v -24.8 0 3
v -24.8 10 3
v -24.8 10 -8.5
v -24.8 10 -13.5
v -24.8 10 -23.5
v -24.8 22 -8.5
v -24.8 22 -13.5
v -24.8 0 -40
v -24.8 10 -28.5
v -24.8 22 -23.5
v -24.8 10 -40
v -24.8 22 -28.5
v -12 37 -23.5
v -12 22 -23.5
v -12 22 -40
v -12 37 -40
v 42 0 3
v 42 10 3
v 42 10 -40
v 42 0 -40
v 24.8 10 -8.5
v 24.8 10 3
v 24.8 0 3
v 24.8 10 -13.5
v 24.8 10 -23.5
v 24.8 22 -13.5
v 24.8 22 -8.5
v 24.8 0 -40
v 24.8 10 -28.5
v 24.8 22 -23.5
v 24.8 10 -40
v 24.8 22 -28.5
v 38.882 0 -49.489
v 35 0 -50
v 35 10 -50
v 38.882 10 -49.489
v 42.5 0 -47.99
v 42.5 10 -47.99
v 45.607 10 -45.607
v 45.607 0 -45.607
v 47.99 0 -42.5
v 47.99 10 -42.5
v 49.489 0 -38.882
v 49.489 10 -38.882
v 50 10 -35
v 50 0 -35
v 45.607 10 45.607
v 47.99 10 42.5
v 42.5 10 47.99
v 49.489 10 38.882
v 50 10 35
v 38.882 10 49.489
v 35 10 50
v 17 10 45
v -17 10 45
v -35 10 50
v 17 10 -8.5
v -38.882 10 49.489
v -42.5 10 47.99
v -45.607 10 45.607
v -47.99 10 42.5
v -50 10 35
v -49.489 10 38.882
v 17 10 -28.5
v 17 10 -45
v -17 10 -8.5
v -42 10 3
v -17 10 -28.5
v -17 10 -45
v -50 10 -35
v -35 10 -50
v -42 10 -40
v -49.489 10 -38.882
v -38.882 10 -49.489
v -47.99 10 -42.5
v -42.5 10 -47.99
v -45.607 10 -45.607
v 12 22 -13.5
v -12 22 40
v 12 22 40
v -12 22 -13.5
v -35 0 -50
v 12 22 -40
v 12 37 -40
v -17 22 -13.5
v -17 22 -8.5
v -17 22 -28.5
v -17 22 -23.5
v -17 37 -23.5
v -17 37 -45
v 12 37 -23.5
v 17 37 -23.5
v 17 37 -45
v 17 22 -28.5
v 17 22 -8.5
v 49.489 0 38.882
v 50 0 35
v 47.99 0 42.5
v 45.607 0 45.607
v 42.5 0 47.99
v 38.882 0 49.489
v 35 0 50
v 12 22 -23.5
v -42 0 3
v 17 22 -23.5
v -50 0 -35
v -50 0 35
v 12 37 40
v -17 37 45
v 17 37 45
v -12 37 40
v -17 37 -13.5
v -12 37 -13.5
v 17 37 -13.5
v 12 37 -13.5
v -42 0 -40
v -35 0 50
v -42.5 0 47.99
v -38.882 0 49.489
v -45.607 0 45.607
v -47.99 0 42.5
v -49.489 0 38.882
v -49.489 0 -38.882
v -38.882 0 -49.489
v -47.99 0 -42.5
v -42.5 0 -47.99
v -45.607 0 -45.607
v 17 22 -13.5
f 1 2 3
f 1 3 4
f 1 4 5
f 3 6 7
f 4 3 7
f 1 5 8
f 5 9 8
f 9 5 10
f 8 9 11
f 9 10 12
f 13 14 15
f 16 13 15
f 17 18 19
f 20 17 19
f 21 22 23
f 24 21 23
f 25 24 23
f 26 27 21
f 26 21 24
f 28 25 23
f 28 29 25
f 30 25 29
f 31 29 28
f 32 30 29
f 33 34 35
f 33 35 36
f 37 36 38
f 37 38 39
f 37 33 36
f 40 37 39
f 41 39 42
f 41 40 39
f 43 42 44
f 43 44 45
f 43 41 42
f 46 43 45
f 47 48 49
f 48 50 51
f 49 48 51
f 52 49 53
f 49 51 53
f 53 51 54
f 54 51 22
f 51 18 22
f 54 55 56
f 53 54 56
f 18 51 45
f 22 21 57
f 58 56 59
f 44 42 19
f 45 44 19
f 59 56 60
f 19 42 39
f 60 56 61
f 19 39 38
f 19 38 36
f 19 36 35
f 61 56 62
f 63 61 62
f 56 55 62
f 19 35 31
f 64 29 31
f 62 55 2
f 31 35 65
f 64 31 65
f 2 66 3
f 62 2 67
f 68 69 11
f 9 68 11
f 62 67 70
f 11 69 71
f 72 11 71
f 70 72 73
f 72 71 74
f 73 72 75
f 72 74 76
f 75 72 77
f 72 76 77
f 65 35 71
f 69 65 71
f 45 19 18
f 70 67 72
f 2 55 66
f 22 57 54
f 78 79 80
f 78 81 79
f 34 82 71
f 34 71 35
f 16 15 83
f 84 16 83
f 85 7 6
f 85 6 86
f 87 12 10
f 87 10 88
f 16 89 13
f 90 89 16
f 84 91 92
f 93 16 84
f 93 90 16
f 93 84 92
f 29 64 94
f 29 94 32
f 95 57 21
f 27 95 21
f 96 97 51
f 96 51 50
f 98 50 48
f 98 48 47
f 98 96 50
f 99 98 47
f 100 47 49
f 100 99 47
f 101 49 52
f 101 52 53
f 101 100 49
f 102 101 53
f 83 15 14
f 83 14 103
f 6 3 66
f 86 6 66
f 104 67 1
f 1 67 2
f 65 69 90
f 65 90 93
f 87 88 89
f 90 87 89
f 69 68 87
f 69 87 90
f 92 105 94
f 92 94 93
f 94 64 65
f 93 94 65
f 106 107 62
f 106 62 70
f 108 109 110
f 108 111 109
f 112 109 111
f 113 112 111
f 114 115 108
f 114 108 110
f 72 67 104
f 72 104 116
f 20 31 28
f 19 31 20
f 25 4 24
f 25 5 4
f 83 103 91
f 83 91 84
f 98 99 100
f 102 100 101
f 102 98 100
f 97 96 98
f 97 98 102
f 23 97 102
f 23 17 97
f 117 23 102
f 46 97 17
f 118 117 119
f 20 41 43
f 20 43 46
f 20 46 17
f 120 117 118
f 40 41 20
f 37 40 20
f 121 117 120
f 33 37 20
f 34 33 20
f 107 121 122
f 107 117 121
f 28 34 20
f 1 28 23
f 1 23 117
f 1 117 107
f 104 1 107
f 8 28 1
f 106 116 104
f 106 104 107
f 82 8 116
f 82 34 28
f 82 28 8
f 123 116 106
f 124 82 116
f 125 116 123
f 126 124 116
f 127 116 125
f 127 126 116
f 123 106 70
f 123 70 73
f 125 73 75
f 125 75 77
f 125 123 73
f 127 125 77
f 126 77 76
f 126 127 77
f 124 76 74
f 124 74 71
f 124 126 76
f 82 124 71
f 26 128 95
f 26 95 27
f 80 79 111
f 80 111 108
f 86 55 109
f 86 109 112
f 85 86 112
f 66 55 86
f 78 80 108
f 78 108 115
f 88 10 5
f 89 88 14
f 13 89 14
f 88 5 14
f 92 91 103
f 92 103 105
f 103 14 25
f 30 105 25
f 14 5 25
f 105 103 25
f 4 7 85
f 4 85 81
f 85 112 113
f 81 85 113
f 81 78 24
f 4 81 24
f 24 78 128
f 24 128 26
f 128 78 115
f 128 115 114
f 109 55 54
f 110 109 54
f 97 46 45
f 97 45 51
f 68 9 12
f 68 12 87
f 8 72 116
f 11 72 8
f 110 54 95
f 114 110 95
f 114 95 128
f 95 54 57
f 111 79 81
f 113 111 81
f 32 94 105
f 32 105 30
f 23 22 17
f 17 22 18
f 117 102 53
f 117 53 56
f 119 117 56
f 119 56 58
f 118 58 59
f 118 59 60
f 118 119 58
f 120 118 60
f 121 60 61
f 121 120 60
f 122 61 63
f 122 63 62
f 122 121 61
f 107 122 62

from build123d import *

# Parameters (mm, degrees)
BOSS_EXTRUDE1_DEPTH = 10
SKETCH3_W           = 17.2
SKETCH3_H           = 43
CUT_EXTRUDE1_DEPTH  = 72.414284285
SKETCH5_W           = 49.6
SKETCH5_H           = 5
BOSS_EXTRUDE3_DEPTH = 12
BOSS_EXTRUDE2_START = -12
SKETCH2_W           = 34
SKETCH2_H           = 90
SKETCH2_W_2         = 24
SKETCH2_H_2         = 80
BOSS_EXTRUDE2_DEPTH = 27
SKETCH6_W           = 5
SKETCH6_H           = 10
CUT_EXTRUDE2_DEPTH  = 27
SKETCH8_W           = 24
SKETCH8_H           = 48.5
SKETCH8_H_2         = 11.5
BOSS_EXTRUDE4_DEPTH = 12


with BuildPart() as part:
    # Sketch1 → Boss-Extrude1 (new body)
    with BuildSketch(Plane(origin=(0, 0, 0), x_dir=(1, 0, 0), z_dir=(0, 1, 0))):
        with BuildLine():
            Line((-35, 50), (35, 50))
            ThreePointArc((35, 50), (45.606601718, 45.606601718), (50, 35))
            Line((50, 35), (50, -35))
            ThreePointArc((50, -35), (45.606601718, -45.606601718), (35, -50))
            Line((35, -50), (-35, -50))
            ThreePointArc((-35, -50), (-45.606601718, -45.606601718), (-50, -35))
            Line((-50, -35), (-50, 35))
            ThreePointArc((-50, 35), (-45.606601718, 45.606601718), (-35, 50))
        make_face()
    extrude(amount=BOSS_EXTRUDE1_DEPTH)

    # Sketch3 → Cut-Extrude1 (cut, through all)
    with BuildSketch(Plane(origin=(0, 10, 0), x_dir=(1, 0, 0), z_dir=(0, 1, 0))):
        with Locations((-33.4, 18.5)):
            Rectangle(SKETCH3_W, SKETCH3_H)
        with Locations((33.4, 18.5)):
            Rectangle(SKETCH3_W, SKETCH3_H)
    extrude(amount=-CUT_EXTRUDE1_DEPTH, mode=Mode.SUBTRACT)

    # Sketch5 → Boss-Extrude3 (add)
    with BuildSketch(Plane(origin=(0, 10, 0), x_dir=(1, 0, 0), z_dir=(0, 1, 0))):
        with Locations((0, 11)):
            Rectangle(SKETCH5_W, SKETCH5_H)
        with Locations((0, 26)):
            Rectangle(SKETCH5_W, SKETCH5_H)
    extrude(amount=BOSS_EXTRUDE3_DEPTH)

    # Sketch2 → Boss-Extrude2 (add)
    with BuildSketch(Plane(origin=(0, 22, 0), x_dir=(1, 0, 0), z_dir=(0, 1, 0)).offset(BOSS_EXTRUDE2_START)):
        Rectangle(SKETCH2_W, SKETCH2_H)
        Rectangle(SKETCH2_W_2, SKETCH2_H_2, mode=Mode.SUBTRACT)
    extrude(amount=BOSS_EXTRUDE2_DEPTH)

    # Sketch6 → Cut-Extrude2 (cut)
    with BuildSketch(Plane(origin=(0, 37, 0), x_dir=(1, 0, 0), z_dir=(0, 1, 0))):
        with Locations((-14.5, 18.5)):
            Rectangle(SKETCH6_W, SKETCH6_H)
        with Locations((14.5, 18.5)):
            Rectangle(SKETCH6_W, SKETCH6_H)
    extrude(amount=-CUT_EXTRUDE2_DEPTH, mode=Mode.SUBTRACT)

    # Sketch8 → Boss-Extrude4 (add)
    with BuildSketch(Plane(origin=(0, 10, 0), x_dir=(1, 0, 0), z_dir=(0, 1, 0))):
        with Locations((0, -15.75)):
            Rectangle(SKETCH8_W, SKETCH8_H)
        with Locations((0, 34.25)):
            Rectangle(SKETCH8_W, SKETCH8_H_2)
    extrude(amount=BOSS_EXTRUDE4_DEPTH)


solid = part.part
